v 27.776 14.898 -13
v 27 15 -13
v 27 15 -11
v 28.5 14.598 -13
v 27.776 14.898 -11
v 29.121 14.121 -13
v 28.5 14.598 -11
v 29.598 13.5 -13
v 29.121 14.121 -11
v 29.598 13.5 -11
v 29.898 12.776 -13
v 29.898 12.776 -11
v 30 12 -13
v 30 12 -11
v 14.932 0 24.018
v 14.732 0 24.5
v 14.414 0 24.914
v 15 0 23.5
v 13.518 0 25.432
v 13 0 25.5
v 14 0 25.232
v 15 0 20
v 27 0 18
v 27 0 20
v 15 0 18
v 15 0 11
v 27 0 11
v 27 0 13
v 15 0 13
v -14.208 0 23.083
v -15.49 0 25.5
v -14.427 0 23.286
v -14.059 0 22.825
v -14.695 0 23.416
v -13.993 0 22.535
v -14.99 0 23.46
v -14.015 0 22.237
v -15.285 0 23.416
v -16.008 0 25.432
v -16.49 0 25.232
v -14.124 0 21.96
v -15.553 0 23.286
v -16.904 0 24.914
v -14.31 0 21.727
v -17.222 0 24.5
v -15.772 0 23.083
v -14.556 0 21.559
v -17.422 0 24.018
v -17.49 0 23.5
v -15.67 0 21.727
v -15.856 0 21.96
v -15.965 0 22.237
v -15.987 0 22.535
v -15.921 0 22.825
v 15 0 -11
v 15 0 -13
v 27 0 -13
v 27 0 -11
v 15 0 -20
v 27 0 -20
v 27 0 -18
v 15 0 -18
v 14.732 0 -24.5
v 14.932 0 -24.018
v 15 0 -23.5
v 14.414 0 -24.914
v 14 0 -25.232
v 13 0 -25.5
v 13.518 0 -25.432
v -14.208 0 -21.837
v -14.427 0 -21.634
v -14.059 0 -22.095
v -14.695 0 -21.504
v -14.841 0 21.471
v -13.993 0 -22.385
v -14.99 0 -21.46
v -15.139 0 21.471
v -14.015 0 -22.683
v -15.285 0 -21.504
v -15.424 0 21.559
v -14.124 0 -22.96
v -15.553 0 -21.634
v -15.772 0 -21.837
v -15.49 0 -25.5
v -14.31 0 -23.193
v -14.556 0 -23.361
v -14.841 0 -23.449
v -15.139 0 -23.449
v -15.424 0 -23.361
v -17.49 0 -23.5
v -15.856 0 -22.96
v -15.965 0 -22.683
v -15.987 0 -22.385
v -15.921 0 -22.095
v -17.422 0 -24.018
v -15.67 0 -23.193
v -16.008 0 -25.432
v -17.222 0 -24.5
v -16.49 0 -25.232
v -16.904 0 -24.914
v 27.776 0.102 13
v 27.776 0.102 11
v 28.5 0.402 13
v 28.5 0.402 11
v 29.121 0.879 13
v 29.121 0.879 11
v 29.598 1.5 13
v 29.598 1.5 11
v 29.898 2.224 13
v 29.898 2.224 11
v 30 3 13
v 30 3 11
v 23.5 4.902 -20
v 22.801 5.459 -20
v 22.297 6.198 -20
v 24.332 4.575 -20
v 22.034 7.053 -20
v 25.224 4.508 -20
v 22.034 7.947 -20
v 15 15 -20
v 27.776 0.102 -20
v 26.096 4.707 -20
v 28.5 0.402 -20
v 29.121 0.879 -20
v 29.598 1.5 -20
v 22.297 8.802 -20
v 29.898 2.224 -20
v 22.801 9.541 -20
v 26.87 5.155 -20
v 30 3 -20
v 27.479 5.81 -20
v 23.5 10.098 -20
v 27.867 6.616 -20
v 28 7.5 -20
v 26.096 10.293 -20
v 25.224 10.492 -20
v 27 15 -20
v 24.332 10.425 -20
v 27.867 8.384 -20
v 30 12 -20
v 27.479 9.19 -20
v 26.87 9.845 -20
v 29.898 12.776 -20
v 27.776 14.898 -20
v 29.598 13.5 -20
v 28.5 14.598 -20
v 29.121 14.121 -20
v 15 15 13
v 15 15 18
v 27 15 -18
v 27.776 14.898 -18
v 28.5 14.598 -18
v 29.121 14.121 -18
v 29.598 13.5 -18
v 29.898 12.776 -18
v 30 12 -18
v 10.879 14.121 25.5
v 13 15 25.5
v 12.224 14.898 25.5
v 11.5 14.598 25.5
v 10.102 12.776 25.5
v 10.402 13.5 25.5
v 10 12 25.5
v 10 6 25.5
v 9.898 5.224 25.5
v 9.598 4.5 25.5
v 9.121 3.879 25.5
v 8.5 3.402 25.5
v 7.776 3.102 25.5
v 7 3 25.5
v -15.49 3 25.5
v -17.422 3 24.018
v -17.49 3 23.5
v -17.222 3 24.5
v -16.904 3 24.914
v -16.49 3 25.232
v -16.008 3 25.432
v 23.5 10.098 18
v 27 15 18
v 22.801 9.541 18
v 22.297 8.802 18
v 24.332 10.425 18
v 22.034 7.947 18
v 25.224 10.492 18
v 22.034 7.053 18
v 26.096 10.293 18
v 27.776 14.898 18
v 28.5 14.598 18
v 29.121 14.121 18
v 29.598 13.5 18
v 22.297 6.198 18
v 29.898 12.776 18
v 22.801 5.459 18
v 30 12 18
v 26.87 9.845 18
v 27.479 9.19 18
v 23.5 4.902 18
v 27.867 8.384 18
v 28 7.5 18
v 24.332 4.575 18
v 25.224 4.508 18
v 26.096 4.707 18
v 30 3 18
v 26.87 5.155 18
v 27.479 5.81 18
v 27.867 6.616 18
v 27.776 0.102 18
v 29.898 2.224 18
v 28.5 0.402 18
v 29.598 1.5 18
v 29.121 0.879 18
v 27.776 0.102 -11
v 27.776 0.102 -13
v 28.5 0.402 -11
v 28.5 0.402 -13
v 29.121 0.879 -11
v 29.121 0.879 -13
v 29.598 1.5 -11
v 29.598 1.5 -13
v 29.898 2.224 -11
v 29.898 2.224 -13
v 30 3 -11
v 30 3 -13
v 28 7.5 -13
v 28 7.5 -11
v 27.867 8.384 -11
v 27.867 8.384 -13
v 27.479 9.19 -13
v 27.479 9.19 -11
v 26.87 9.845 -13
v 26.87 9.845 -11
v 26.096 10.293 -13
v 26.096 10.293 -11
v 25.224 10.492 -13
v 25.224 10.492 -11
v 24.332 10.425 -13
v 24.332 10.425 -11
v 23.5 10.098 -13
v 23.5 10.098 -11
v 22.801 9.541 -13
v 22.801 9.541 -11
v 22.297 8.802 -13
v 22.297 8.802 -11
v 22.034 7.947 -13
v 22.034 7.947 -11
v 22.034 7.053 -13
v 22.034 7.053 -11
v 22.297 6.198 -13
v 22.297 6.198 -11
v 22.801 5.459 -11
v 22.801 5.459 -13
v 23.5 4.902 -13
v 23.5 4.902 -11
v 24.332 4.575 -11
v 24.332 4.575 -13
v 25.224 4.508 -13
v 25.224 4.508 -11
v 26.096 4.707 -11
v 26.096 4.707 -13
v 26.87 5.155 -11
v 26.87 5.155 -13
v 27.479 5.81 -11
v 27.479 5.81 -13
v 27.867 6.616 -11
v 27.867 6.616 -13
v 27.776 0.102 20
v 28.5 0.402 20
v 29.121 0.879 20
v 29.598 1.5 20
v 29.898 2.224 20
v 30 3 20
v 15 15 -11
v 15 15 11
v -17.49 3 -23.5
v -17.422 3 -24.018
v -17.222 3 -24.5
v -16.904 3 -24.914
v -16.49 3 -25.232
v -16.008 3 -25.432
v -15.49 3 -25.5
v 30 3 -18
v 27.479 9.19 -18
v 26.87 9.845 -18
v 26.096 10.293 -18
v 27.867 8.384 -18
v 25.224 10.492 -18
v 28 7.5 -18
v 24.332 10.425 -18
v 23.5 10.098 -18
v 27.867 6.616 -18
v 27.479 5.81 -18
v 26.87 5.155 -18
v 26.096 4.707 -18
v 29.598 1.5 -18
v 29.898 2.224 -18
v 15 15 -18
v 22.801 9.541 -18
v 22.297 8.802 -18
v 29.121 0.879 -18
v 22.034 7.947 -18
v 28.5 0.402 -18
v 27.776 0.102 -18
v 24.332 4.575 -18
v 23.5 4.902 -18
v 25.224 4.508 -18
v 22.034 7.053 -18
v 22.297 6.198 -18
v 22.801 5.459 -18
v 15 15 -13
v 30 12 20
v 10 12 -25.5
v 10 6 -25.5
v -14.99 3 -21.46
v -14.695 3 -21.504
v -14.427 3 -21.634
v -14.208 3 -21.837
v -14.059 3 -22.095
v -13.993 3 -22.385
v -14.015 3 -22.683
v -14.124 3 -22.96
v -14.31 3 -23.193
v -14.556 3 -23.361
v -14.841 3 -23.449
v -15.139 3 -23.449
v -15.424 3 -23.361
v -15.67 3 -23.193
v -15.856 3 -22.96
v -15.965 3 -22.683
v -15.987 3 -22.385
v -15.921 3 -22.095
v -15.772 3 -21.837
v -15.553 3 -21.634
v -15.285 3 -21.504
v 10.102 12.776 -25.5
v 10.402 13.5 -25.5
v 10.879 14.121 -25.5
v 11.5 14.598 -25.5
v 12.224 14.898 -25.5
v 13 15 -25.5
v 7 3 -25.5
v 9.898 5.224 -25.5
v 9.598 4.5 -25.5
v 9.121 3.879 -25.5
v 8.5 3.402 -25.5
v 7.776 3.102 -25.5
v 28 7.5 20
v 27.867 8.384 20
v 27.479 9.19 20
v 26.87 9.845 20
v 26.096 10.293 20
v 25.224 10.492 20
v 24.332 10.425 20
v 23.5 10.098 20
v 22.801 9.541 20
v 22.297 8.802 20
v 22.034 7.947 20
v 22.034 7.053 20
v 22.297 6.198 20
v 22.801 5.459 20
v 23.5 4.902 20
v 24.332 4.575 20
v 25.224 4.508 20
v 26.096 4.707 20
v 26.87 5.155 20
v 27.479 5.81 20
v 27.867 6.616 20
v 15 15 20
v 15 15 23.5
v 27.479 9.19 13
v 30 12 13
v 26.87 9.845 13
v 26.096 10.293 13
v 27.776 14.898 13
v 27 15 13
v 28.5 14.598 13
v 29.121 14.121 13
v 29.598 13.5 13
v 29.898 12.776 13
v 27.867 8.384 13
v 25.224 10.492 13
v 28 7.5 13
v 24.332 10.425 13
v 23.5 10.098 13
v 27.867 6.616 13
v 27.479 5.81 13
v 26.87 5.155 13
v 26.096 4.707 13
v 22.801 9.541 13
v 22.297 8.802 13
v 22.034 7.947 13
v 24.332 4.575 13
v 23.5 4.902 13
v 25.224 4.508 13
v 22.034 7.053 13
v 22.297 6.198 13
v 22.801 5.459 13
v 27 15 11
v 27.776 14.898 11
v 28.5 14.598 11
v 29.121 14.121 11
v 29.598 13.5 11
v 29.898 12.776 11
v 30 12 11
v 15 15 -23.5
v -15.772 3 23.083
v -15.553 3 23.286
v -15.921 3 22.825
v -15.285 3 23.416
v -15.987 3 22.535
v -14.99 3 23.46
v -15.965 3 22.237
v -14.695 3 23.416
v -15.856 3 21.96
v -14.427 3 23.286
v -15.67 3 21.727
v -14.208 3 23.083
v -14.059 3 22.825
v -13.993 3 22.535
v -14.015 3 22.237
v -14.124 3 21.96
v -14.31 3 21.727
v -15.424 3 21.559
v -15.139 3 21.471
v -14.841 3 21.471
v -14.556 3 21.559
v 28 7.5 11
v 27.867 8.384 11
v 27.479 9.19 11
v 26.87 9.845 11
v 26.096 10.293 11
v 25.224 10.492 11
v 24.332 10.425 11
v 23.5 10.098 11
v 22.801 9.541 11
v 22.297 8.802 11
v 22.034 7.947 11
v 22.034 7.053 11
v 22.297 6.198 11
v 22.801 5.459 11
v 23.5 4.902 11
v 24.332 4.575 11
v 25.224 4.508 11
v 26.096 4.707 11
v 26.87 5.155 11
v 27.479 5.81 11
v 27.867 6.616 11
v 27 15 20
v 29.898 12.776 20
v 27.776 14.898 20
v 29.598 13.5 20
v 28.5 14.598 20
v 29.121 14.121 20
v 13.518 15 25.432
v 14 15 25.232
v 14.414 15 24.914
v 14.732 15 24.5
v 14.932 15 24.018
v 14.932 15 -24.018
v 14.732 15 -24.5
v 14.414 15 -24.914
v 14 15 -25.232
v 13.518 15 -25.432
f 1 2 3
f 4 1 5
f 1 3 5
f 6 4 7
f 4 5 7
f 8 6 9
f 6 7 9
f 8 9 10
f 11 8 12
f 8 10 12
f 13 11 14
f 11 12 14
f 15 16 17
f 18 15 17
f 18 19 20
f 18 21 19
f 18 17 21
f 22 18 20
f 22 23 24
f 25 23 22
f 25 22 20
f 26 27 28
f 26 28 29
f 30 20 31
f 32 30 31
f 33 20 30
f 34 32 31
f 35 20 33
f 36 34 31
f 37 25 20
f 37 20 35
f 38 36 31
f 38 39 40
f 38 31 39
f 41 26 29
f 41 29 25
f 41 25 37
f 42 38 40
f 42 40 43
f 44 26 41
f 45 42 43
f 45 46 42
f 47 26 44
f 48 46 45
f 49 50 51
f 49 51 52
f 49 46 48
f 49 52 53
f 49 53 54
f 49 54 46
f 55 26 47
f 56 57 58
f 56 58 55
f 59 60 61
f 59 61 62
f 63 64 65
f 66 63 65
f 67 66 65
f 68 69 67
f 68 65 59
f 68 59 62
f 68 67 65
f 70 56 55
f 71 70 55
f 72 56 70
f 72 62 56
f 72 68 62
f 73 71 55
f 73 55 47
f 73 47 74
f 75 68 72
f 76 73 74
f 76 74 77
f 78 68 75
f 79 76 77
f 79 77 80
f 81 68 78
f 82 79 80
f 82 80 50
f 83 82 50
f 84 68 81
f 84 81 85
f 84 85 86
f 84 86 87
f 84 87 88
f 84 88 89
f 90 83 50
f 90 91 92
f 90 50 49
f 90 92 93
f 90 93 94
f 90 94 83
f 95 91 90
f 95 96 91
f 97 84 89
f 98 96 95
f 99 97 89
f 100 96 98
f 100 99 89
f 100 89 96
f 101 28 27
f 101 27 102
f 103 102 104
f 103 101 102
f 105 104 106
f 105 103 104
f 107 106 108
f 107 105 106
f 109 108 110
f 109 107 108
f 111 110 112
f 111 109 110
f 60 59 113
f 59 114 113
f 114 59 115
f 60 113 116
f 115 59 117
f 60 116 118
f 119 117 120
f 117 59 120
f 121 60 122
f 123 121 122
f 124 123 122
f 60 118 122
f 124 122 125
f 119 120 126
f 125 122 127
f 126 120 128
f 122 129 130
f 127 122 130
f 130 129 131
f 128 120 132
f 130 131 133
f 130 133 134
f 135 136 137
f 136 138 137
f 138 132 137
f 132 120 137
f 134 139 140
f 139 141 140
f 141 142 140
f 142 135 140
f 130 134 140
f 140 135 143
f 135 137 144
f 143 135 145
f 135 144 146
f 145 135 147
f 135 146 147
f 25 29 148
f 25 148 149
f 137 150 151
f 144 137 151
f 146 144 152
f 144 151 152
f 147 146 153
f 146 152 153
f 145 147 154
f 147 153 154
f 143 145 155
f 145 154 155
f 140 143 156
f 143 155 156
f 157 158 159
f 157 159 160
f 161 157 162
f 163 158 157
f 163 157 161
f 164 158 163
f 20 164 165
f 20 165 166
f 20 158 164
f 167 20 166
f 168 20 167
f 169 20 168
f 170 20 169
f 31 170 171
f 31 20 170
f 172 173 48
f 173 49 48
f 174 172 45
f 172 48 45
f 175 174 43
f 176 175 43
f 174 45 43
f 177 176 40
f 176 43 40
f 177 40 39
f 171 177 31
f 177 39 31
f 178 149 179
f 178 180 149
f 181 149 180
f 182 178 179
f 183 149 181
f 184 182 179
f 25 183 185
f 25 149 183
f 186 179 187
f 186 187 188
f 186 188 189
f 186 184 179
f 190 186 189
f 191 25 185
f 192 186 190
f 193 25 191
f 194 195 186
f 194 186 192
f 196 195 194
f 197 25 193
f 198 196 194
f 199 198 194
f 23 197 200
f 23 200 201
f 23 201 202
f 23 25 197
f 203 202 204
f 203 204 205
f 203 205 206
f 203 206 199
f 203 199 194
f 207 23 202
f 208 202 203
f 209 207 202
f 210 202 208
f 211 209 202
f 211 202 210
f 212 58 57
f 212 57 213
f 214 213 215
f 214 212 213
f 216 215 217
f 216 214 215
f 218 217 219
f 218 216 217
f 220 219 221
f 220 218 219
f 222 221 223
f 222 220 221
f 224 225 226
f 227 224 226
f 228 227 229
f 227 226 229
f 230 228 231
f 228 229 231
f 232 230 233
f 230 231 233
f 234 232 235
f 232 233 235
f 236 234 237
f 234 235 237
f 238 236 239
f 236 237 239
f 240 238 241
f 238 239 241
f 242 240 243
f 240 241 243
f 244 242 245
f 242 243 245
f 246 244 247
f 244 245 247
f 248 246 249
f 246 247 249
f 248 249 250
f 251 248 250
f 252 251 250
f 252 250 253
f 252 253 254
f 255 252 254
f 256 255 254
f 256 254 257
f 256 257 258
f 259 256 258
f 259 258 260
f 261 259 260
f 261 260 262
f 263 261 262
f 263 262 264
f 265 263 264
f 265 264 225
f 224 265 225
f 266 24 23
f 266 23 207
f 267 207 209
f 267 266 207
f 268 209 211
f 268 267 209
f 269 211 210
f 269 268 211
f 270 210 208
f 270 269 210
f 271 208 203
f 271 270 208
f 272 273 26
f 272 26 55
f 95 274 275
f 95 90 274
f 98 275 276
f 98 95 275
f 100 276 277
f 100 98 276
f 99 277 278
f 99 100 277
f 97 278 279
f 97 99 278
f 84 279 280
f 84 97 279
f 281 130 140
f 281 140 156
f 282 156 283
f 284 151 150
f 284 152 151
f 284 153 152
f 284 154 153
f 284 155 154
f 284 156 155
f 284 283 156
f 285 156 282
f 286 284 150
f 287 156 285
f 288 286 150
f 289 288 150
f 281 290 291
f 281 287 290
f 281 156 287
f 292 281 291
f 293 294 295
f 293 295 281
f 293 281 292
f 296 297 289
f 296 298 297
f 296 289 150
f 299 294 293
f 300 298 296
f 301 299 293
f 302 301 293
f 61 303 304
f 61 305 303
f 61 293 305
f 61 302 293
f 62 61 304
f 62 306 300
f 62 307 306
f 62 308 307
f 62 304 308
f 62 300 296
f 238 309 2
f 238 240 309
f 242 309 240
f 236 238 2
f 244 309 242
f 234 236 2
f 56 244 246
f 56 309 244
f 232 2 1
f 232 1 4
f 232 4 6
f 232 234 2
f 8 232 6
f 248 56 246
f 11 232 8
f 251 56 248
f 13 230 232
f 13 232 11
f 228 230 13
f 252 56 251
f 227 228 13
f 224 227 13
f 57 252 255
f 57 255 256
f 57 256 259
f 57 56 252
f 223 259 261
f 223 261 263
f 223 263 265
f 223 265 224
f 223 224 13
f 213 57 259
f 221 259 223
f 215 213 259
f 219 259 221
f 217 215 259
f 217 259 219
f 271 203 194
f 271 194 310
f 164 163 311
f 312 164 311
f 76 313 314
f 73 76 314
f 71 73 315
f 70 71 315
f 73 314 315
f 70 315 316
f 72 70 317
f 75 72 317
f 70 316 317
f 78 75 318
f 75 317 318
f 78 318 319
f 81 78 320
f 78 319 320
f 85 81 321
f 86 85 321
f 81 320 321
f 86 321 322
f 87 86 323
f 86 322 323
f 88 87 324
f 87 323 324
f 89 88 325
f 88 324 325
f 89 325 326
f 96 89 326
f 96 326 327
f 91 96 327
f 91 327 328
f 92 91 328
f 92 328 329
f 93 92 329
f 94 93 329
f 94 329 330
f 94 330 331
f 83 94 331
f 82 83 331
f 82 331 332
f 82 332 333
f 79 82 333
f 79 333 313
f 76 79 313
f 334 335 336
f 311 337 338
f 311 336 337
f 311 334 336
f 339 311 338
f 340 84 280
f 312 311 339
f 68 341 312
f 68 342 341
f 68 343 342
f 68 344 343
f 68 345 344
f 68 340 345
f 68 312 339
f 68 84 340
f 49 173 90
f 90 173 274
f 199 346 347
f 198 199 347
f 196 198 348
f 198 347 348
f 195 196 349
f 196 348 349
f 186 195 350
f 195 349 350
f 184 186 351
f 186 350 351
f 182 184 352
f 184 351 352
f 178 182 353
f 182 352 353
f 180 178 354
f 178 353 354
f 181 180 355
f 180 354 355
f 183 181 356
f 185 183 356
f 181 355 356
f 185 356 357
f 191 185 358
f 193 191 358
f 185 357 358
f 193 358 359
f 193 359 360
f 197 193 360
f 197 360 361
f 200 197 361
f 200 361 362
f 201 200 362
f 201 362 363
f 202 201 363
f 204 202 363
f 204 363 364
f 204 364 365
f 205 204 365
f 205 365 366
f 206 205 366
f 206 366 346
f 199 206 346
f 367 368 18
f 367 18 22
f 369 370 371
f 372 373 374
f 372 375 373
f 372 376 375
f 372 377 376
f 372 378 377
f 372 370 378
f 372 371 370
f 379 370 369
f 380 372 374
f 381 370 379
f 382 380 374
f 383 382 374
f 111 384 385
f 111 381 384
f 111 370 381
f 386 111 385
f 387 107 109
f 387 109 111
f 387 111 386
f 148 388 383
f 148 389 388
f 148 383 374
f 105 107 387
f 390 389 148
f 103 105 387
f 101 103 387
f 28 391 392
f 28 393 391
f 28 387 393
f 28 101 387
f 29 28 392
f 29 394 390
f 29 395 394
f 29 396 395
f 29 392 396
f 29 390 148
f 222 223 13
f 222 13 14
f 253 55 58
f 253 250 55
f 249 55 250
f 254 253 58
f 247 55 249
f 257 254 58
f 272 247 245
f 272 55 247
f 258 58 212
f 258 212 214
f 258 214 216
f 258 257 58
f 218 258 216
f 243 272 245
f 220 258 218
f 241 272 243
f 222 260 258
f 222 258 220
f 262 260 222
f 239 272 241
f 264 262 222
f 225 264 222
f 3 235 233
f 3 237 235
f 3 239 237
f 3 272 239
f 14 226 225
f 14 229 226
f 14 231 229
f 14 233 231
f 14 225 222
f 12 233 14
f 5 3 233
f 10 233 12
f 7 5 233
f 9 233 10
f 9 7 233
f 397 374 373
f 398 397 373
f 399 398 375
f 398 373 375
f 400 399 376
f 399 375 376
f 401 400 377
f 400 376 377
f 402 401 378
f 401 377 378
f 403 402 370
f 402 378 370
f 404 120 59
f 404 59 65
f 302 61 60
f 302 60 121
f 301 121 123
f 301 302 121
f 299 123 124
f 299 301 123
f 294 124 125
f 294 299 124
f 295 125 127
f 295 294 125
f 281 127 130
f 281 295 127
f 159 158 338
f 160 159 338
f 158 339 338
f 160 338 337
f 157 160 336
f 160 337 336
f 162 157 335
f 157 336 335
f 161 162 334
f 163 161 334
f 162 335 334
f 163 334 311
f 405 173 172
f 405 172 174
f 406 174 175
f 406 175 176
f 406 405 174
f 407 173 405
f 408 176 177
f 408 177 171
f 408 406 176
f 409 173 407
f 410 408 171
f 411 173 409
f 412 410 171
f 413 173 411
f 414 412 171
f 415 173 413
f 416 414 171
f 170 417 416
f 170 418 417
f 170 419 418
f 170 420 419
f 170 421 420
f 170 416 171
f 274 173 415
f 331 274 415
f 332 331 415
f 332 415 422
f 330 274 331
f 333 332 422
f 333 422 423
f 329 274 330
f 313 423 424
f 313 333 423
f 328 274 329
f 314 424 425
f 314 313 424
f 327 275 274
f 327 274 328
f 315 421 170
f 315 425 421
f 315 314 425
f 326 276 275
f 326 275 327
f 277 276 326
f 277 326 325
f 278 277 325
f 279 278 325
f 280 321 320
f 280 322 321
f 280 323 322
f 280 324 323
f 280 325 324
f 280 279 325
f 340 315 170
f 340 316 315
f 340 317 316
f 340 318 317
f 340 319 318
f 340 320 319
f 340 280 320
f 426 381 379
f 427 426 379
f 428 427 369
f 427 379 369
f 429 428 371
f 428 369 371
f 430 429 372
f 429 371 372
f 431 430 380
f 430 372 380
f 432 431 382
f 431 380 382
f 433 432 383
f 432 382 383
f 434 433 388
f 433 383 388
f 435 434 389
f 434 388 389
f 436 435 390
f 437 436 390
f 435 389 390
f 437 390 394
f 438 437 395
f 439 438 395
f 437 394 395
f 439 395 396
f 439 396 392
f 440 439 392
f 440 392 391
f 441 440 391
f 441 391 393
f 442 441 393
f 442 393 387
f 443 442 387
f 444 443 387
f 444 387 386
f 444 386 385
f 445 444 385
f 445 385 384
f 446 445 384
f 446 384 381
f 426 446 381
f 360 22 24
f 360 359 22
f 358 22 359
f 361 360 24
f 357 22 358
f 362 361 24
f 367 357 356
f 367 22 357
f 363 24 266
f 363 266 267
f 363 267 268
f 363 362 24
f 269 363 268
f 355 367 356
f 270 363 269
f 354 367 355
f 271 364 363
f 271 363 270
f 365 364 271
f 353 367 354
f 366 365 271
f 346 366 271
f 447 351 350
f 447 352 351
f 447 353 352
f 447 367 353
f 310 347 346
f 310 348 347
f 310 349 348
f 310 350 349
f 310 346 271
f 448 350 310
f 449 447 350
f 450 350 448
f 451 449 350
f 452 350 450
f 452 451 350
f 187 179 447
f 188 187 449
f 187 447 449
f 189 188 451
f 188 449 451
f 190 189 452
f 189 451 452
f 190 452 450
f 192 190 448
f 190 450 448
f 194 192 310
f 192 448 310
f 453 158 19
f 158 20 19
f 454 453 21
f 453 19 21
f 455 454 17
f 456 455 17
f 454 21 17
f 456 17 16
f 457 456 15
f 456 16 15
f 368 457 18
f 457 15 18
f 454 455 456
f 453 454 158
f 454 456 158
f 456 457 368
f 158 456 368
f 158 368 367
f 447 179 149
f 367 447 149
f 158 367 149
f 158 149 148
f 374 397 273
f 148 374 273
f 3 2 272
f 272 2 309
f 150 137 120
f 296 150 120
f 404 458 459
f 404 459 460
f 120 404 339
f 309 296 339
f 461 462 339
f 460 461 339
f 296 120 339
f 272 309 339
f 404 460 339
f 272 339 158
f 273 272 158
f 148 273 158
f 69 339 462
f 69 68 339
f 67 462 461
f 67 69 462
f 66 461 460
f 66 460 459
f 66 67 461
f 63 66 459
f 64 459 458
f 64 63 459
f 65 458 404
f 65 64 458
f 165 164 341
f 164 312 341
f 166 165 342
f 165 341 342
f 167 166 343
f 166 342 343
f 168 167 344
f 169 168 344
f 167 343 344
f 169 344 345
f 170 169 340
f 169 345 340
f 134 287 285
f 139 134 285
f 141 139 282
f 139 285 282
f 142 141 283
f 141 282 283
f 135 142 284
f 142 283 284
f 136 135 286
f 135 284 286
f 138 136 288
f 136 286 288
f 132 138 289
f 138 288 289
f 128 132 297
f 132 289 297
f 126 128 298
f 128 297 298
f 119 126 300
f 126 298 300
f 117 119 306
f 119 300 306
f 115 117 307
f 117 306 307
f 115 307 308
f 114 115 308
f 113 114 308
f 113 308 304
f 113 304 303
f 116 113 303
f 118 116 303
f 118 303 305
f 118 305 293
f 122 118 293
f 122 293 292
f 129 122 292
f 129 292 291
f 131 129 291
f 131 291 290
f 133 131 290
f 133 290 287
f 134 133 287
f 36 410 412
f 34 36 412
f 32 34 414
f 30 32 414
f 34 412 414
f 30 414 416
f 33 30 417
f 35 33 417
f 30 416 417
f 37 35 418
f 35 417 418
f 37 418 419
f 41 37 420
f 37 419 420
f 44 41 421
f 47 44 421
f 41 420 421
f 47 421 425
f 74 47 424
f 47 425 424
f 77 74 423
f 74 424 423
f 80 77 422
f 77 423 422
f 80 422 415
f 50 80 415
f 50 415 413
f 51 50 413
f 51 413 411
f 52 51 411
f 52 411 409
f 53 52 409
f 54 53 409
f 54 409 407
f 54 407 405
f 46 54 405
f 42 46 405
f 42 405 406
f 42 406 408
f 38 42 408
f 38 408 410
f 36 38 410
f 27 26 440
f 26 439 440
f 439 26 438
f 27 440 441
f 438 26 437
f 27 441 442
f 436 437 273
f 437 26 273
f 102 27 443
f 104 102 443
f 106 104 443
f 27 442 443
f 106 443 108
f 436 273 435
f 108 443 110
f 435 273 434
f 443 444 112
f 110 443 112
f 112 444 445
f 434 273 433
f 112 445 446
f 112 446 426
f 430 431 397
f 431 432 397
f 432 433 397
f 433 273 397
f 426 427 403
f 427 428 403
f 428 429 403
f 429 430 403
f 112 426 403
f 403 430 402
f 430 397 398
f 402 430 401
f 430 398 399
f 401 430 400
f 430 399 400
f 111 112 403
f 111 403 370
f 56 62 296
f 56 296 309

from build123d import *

# Parameters (mm, degrees)
BOSS_EXTRUDE1_DEPTH = 15
SKETCH2_R           = 3
CUT_EXTRUDE1_DEPTH  = 51
FILLET1_R           = 3
FILLET2_R           = 3
FILLET3_R           = 3
FILLET4_R           = 3
FILLET5_R           = 3
FILLET6_R           = 3
SKETCH4_W           = 40
SKETCH4_H           = 51
CUT_EXTRUDE2_DEPTH  = 12
SKETCH5_R           = 1
CUT_EXTRUDE3_DEPTH  = 12
FILLET7_R           = 3
FILLET8_R           = 3
SKETCH7_W           = 15
SKETCH7_H           = 22
CUT_EXTRUDE5_DEPTH  = 20
SKETCH9_W           = 15
SKETCH9_H           = 5.5
CUT_EXTRUDE6_DEPTH  = 20
FILLET11_R          = 2
FILLET12_R          = 2
SKETCH11_W          = 12.51
SKETCH11_H          = 51
CUT_EXTRUDE7_DEPTH  = 3
FILLET13_R          = 2
FILLET14_R          = 2


with BuildPart() as part:
    # Sketch1 → Boss-Extrude1 (new body)
    with BuildSketch(Plane(origin=(0, 0, 0), x_dir=(1, 0, 0), z_dir=(0, 1, 0))):
        Polygon((-30, 25.5), (30, 25.5), (30, 18), (15, 18), (15, 13), (30, 13), (30, -13), (15, -13), (15, -18), (30, -18), (30, -25.5), (-30, -25.5), align=None)
    extrude(amount=BOSS_EXTRUDE1_DEPTH)

    # Sketch2 → Cut-Extrude1 (cut)
    with BuildSketch(Plane.XY.offset(25.5)):
        with Locations((25, 7.5)):
            Circle(SKETCH2_R)
    extrude(amount=-CUT_EXTRUDE1_DEPTH, mode=Mode.SUBTRACT)

    # Fillet1
    fillet1_edges = [part.edges().sort_by_distance(p)[0] for p in [
        (30, 15, 21.75),
    ]]
    fillet(fillet1_edges, radius=FILLET1_R)

    # Fillet2
    fillet2_edges = [part.edges().sort_by_distance(p)[0] for p in [
        (30, 15, 0),
    ]]
    fillet(fillet2_edges, radius=FILLET2_R)

    # Fillet3
    fillet3_edges = [part.edges().sort_by_distance(p)[0] for p in [
        (30, 15, -21.75),
    ]]
    fillet(fillet3_edges, radius=FILLET3_R)

    # Fillet4
    fillet4_edges = [part.edges().sort_by_distance(p)[0] for p in [
        (30, 0, 21.75),
    ]]
    fillet(fillet4_edges, radius=FILLET4_R)

    # Fillet5
    fillet5_edges = [part.edges().sort_by_distance(p)[0] for p in [
        (30, 0, 0),
    ]]
    fillet(fillet5_edges, radius=FILLET5_R)

    # Fillet6
    fillet6_edges = [part.edges().sort_by_distance(p)[0] for p in [
        (30, 0, -21.75),
    ]]
    fillet(fillet6_edges, radius=FILLET6_R)

    # Sketch4 → Cut-Extrude2 (cut)
    with BuildSketch(Plane(origin=(0, 15, 0), x_dir=(1, 0, 0), z_dir=(0, 1, 0))):
        with Locations((-10, 0)):
            Rectangle(SKETCH4_W, SKETCH4_H)
    extrude(amount=-CUT_EXTRUDE2_DEPTH, mode=Mode.SUBTRACT)

    # Sketch5 → Cut-Extrude3 (cut)
    with BuildSketch(Plane(origin=(0, 3, 0), x_dir=(1, 0, 0), z_dir=(0, 1, 0))):
        with Locations(Location((-14.99, 22.46, 0), (0, 0, 270))):
            Circle(SKETCH5_R)
        with Locations(Location((-14.99, -22.46, 0), (0, 0, 270))):
            Circle(SKETCH5_R)
    extrude(amount=-CUT_EXTRUDE3_DEPTH, mode=Mode.SUBTRACT)

    # Fillet7
    fillet7_edges = [part.edges().sort_by_distance(p)[0] for p in [
        (10, 15, 0),
    ]]
    fillet(fillet7_edges, radius=FILLET7_R)

    # Fillet8
    fillet8_edges = [part.edges().sort_by_distance(p)[0] for p in [
        (10, 3, 0),
    ]]
    fillet(fillet8_edges, radius=FILLET8_R)

    # Sketch7 → Cut-Extrude5 (cut)
    with BuildSketch(Plane(origin=(0, 15, 0), x_dir=(1, 0, 0), z_dir=(0, 1, 0))):
        with Locations((22.5, 0)):
            Rectangle(SKETCH7_W, SKETCH7_H)
    extrude(amount=-CUT_EXTRUDE5_DEPTH, mode=Mode.SUBTRACT)

    # Sketch9 → Cut-Extrude6 (cut)
    with BuildSketch(Plane(origin=(0, 15, 0), x_dir=(1, 0, 0), z_dir=(0, 1, 0))):
        with Locations((22.5, 22.75)):
            Rectangle(SKETCH9_W, SKETCH9_H)
        with Locations((22.5, -22.75)):
            Rectangle(SKETCH9_W, SKETCH9_H)
    extrude(amount=-CUT_EXTRUDE6_DEPTH, mode=Mode.SUBTRACT)

    # Fillet11
    fillet11_edges = [part.edges().sort_by_distance(p)[0] for p in [
        (15, 7.5, 25.5),
    ]]
    fillet(fillet11_edges, radius=FILLET11_R)

    # Fillet12
    fillet12_edges = [part.edges().sort_by_distance(p)[0] for p in [
        (15, 7.5, -25.5),
    ]]
    fillet(fillet12_edges, radius=FILLET12_R)

    # Sketch11 → Cut-Extrude7 (cut)
    with BuildSketch(Plane(origin=(0, 3, 0), x_dir=(1, 0, 0), z_dir=(0, 1, 0))):
        with Locations((-23.745, 0)):
            Rectangle(SKETCH11_W, SKETCH11_H)
    extrude(amount=-CUT_EXTRUDE7_DEPTH, mode=Mode.SUBTRACT)

    # Fillet13
    fillet13_edges = [part.edges().sort_by_distance(p)[0] for p in [
        (-17.49, 1.5, 25.5),
    ]]
    fillet(fillet13_edges, radius=FILLET13_R)

    # Fillet14
    fillet14_edges = [part.edges().sort_by_distance(p)[0] for p in [
        (-17.49, 1.5, -25.5),
    ]]
    fillet(fillet14_edges, radius=FILLET14_R)


solid = part.part
